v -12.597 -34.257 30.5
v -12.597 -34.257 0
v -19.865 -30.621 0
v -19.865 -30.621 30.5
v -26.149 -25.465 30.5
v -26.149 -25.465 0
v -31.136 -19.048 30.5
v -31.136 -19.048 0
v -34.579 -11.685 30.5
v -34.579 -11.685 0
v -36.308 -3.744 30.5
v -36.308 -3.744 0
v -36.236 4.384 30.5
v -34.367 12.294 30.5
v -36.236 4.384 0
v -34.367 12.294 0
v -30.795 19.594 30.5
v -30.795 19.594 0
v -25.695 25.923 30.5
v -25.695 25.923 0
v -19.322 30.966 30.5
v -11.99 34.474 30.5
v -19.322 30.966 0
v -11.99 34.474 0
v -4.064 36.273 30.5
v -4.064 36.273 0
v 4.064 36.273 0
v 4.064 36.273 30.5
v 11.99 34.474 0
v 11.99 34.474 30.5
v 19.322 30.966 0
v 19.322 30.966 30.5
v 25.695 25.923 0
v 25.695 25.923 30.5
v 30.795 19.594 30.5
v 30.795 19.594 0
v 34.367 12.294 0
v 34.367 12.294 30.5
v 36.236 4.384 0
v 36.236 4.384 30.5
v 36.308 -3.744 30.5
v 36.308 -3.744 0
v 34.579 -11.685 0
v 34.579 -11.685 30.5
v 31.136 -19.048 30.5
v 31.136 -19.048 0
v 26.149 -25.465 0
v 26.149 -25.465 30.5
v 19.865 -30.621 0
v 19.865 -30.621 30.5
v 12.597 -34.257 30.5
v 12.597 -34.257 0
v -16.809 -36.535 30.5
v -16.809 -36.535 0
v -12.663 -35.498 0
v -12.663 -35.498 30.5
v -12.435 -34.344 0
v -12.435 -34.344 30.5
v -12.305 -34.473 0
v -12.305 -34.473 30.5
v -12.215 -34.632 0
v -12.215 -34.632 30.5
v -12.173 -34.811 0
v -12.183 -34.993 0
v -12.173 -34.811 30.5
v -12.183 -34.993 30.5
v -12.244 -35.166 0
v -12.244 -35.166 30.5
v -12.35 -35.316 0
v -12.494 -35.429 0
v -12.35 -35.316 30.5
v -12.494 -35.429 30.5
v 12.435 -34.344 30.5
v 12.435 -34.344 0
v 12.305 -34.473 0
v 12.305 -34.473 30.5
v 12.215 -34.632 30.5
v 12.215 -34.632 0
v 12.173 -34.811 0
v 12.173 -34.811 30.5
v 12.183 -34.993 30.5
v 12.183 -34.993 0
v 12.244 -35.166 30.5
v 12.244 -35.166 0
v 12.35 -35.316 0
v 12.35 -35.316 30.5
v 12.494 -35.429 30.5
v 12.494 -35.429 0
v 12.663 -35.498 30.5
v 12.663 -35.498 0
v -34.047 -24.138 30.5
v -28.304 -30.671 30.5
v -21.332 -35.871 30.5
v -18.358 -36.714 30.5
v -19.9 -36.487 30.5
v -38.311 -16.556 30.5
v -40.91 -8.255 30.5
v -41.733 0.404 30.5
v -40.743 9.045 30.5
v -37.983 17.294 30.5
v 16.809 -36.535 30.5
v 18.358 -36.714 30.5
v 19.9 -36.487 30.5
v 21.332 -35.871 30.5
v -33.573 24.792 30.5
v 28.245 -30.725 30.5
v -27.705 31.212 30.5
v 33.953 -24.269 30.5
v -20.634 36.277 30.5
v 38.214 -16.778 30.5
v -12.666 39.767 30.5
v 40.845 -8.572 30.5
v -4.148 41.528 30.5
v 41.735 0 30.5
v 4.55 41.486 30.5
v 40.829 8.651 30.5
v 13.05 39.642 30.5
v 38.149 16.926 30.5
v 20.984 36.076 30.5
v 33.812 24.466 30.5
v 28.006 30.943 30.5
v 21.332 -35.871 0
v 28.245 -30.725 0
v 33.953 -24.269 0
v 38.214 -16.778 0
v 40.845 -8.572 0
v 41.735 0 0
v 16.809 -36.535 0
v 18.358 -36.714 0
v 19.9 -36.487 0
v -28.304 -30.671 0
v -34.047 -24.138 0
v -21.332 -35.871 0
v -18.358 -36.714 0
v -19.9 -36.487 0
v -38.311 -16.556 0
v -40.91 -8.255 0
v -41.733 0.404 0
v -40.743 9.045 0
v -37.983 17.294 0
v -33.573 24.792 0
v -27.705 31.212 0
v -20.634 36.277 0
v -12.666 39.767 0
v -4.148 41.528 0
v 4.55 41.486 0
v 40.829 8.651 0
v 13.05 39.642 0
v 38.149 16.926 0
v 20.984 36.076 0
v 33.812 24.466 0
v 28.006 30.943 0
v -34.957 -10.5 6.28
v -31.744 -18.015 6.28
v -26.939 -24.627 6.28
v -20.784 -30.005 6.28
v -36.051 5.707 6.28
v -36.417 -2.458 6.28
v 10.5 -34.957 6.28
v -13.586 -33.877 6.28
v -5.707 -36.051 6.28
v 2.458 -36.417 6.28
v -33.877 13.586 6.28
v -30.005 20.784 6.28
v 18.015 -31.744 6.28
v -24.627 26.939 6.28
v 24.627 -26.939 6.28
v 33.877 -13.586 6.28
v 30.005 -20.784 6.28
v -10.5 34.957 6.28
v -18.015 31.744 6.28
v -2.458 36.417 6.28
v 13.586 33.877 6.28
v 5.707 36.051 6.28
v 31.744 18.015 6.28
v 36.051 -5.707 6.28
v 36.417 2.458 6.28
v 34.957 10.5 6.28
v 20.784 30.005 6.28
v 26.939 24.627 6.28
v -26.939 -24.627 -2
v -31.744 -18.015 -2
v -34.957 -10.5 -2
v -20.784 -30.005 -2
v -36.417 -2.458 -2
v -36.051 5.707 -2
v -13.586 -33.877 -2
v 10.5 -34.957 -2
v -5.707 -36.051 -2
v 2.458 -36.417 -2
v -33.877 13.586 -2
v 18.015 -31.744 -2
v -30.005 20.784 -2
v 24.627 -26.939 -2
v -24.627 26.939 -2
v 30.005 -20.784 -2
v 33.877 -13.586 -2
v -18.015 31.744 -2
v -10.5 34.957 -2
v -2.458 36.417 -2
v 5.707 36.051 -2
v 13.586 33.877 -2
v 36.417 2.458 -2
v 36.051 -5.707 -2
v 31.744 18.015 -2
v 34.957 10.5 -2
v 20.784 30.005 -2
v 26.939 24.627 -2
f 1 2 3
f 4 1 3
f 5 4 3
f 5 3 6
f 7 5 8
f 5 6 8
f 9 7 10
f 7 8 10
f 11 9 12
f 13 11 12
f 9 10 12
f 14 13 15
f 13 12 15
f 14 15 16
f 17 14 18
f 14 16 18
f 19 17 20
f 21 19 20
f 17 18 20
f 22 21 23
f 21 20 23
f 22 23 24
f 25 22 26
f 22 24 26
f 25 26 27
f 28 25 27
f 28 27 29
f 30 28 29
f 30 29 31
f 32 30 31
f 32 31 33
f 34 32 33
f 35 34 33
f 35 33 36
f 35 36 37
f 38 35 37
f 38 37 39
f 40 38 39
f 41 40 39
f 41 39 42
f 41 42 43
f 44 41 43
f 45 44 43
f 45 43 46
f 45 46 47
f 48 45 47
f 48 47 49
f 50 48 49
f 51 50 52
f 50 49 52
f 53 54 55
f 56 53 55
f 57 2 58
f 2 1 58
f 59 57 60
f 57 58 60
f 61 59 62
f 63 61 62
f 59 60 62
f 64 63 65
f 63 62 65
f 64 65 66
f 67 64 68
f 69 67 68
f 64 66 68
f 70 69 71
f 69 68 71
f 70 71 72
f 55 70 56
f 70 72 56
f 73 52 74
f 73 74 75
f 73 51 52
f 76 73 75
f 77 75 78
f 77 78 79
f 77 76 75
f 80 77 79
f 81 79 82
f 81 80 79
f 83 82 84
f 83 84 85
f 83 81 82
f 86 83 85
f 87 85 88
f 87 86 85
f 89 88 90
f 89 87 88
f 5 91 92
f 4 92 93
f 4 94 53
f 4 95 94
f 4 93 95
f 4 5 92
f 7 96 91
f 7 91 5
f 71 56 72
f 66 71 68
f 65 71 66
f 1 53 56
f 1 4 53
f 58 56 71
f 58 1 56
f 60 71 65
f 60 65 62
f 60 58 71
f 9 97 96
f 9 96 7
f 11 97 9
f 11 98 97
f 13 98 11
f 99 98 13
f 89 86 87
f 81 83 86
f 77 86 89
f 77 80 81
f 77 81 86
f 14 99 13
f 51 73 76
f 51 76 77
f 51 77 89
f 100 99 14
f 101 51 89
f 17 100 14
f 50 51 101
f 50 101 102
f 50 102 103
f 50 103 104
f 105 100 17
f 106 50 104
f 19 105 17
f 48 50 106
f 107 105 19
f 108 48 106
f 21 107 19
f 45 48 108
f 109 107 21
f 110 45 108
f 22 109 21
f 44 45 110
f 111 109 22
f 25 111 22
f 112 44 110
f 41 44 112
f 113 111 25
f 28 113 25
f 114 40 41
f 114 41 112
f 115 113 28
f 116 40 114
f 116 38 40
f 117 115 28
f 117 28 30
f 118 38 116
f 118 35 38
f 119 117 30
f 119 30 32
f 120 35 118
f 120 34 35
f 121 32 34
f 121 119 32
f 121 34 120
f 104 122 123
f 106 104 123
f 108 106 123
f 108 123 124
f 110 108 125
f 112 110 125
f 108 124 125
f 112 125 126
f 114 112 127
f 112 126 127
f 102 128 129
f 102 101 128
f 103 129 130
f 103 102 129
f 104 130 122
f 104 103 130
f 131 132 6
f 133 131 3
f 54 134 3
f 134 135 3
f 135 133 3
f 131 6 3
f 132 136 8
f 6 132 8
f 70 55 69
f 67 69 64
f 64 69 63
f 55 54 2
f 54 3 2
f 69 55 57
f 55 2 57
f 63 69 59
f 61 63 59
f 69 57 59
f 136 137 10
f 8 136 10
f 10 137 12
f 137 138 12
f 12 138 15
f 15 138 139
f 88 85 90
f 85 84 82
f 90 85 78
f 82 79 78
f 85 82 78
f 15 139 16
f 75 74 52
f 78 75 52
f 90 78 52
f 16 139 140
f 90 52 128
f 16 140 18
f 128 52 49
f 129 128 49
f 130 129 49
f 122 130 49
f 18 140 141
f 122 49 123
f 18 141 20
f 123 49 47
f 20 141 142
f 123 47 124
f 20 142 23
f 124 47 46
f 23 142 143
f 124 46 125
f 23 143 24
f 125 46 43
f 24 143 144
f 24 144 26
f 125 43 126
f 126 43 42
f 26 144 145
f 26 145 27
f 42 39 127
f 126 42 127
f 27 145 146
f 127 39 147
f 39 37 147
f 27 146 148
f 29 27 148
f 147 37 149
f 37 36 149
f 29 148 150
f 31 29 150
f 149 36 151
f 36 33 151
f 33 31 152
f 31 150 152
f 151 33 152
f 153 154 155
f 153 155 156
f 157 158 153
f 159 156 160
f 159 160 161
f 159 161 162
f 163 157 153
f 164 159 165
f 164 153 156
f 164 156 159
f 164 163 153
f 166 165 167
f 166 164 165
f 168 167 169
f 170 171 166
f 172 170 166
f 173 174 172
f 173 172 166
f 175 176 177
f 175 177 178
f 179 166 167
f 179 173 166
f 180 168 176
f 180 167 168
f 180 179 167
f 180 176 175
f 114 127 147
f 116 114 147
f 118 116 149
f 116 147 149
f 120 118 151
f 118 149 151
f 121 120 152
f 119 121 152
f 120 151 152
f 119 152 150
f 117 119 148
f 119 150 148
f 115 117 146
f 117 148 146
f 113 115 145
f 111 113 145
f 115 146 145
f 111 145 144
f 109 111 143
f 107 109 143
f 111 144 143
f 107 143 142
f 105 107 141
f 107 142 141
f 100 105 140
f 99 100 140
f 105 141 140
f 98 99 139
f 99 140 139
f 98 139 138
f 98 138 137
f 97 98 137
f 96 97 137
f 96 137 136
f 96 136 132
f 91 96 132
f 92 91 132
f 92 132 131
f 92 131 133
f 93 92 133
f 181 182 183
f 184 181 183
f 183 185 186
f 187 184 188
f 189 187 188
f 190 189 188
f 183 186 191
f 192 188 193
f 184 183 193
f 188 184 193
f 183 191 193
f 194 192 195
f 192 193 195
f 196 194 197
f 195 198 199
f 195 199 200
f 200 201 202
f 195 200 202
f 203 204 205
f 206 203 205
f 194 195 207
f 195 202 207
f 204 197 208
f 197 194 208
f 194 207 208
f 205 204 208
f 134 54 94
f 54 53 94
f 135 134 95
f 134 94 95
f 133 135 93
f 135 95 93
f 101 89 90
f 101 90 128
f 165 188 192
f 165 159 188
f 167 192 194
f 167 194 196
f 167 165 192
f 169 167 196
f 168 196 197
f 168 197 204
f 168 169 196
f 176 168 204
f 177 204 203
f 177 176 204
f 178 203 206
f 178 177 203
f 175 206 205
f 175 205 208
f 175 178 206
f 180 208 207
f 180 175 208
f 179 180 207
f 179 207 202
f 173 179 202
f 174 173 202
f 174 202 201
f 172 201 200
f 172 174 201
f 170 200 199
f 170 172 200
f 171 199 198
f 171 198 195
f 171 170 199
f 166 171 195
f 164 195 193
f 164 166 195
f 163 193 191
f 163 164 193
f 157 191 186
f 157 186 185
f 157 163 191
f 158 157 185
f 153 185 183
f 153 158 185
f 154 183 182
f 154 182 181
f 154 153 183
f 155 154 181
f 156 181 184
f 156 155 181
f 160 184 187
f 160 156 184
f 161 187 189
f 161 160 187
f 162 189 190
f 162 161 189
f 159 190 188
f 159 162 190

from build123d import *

# Parameters (mm, degrees)
F1_DEPTH = 30.5
F2_F1_R  = 0.65
F2_F2_R  = 0.65
F3_R     = 6
F4_DEPTH = 6.28
F5_DEPTH = 2


with BuildPart() as f1:
    # F0 (on Top) → F1 (new body)
    with BuildSketch(Plane.XY):
        with BuildLine():
            ThreePointArc((19.1, -37.1079536623), (35.6296837272, -21.7332892701), (41.735, 0))
            ThreePointArc((41.735, 0), (-21.7332892701, 35.6296837272), (-19.1, -37.1079536623))
            Line((-19.1, -37.1079536623), (-10.5, -34.9571165859))
            ThreePointArc((-10.5, -34.9571165859), (-21.7830209108, 29.2873692912), (36.5, 0))
            ThreePointArc((36.5, 0), (29.2873692912, -21.7830209108), (10.5, -34.9571165859))
            Line((10.5, -34.9571165859), (19.1, -37.1079536623))
        make_face()
    extrude(amount=F1_DEPTH)

    # F2: fillet of radius 0.65 on 2 edges, made by hand

    # F2_f1
    f2_f1_edges = [f1.edges().sort_by_distance(p)[0] for p in [
        (10.5, -34.9571165859, 15.25),
    ]]
    fillet(f2_f1_edges, radius=F2_F1_R)

    # F2_f2
    f2_f2_edges = [f1.edges().sort_by_distance(p)[0] for p in [
        (-10.5, -34.9571165859, 15.25),
    ]]
    fillet(f2_f2_edges, radius=F2_F2_R)

    # F3
    f3_edges = [f1.edges().sort_by_distance(p)[0] for p in [
        (-19.1, -37.107954, 15.25),
        (19.1, -37.107954, 15.25),
    ]]
    fillet(f3_edges, radius=F3_R)


with BuildPart() as f4:
    # F0 (on Top) → F4 (new body)
    with BuildSketch(Plane.XY):
        with BuildLine():
            ThreePointArc((36.5, 0), (-21.7830209108, 29.2873692912), (-10.5, -34.9571165859))
            Line((-10.5, -34.9571165859), (0, 0))
            Line((0, 0), (10.5, -34.9571165859))
            ThreePointArc((10.5, -34.9571165859), (29.2873692912, -21.7830209108), (36.5, 0))
        make_face()
        with BuildLine():
            Line((0, 0), (-10.5, -34.9571165859))
            ThreePointArc((-10.5, -34.9571165859), (0, -36.5), (10.5, -34.9571165859))
            Line((10.5, -34.9571165859), (0, 0))
        make_face()
    extrude(amount=F4_DEPTH)

    # F5 (add): a face of the model
    f5_faces = [f4.faces().sort_by_distance(p)[0] for p in [
        (0, 0, 0),
    ]]
    extrude(f5_faces, amount=F5_DEPTH)


solid = Compound([f1.part, f4.part])
